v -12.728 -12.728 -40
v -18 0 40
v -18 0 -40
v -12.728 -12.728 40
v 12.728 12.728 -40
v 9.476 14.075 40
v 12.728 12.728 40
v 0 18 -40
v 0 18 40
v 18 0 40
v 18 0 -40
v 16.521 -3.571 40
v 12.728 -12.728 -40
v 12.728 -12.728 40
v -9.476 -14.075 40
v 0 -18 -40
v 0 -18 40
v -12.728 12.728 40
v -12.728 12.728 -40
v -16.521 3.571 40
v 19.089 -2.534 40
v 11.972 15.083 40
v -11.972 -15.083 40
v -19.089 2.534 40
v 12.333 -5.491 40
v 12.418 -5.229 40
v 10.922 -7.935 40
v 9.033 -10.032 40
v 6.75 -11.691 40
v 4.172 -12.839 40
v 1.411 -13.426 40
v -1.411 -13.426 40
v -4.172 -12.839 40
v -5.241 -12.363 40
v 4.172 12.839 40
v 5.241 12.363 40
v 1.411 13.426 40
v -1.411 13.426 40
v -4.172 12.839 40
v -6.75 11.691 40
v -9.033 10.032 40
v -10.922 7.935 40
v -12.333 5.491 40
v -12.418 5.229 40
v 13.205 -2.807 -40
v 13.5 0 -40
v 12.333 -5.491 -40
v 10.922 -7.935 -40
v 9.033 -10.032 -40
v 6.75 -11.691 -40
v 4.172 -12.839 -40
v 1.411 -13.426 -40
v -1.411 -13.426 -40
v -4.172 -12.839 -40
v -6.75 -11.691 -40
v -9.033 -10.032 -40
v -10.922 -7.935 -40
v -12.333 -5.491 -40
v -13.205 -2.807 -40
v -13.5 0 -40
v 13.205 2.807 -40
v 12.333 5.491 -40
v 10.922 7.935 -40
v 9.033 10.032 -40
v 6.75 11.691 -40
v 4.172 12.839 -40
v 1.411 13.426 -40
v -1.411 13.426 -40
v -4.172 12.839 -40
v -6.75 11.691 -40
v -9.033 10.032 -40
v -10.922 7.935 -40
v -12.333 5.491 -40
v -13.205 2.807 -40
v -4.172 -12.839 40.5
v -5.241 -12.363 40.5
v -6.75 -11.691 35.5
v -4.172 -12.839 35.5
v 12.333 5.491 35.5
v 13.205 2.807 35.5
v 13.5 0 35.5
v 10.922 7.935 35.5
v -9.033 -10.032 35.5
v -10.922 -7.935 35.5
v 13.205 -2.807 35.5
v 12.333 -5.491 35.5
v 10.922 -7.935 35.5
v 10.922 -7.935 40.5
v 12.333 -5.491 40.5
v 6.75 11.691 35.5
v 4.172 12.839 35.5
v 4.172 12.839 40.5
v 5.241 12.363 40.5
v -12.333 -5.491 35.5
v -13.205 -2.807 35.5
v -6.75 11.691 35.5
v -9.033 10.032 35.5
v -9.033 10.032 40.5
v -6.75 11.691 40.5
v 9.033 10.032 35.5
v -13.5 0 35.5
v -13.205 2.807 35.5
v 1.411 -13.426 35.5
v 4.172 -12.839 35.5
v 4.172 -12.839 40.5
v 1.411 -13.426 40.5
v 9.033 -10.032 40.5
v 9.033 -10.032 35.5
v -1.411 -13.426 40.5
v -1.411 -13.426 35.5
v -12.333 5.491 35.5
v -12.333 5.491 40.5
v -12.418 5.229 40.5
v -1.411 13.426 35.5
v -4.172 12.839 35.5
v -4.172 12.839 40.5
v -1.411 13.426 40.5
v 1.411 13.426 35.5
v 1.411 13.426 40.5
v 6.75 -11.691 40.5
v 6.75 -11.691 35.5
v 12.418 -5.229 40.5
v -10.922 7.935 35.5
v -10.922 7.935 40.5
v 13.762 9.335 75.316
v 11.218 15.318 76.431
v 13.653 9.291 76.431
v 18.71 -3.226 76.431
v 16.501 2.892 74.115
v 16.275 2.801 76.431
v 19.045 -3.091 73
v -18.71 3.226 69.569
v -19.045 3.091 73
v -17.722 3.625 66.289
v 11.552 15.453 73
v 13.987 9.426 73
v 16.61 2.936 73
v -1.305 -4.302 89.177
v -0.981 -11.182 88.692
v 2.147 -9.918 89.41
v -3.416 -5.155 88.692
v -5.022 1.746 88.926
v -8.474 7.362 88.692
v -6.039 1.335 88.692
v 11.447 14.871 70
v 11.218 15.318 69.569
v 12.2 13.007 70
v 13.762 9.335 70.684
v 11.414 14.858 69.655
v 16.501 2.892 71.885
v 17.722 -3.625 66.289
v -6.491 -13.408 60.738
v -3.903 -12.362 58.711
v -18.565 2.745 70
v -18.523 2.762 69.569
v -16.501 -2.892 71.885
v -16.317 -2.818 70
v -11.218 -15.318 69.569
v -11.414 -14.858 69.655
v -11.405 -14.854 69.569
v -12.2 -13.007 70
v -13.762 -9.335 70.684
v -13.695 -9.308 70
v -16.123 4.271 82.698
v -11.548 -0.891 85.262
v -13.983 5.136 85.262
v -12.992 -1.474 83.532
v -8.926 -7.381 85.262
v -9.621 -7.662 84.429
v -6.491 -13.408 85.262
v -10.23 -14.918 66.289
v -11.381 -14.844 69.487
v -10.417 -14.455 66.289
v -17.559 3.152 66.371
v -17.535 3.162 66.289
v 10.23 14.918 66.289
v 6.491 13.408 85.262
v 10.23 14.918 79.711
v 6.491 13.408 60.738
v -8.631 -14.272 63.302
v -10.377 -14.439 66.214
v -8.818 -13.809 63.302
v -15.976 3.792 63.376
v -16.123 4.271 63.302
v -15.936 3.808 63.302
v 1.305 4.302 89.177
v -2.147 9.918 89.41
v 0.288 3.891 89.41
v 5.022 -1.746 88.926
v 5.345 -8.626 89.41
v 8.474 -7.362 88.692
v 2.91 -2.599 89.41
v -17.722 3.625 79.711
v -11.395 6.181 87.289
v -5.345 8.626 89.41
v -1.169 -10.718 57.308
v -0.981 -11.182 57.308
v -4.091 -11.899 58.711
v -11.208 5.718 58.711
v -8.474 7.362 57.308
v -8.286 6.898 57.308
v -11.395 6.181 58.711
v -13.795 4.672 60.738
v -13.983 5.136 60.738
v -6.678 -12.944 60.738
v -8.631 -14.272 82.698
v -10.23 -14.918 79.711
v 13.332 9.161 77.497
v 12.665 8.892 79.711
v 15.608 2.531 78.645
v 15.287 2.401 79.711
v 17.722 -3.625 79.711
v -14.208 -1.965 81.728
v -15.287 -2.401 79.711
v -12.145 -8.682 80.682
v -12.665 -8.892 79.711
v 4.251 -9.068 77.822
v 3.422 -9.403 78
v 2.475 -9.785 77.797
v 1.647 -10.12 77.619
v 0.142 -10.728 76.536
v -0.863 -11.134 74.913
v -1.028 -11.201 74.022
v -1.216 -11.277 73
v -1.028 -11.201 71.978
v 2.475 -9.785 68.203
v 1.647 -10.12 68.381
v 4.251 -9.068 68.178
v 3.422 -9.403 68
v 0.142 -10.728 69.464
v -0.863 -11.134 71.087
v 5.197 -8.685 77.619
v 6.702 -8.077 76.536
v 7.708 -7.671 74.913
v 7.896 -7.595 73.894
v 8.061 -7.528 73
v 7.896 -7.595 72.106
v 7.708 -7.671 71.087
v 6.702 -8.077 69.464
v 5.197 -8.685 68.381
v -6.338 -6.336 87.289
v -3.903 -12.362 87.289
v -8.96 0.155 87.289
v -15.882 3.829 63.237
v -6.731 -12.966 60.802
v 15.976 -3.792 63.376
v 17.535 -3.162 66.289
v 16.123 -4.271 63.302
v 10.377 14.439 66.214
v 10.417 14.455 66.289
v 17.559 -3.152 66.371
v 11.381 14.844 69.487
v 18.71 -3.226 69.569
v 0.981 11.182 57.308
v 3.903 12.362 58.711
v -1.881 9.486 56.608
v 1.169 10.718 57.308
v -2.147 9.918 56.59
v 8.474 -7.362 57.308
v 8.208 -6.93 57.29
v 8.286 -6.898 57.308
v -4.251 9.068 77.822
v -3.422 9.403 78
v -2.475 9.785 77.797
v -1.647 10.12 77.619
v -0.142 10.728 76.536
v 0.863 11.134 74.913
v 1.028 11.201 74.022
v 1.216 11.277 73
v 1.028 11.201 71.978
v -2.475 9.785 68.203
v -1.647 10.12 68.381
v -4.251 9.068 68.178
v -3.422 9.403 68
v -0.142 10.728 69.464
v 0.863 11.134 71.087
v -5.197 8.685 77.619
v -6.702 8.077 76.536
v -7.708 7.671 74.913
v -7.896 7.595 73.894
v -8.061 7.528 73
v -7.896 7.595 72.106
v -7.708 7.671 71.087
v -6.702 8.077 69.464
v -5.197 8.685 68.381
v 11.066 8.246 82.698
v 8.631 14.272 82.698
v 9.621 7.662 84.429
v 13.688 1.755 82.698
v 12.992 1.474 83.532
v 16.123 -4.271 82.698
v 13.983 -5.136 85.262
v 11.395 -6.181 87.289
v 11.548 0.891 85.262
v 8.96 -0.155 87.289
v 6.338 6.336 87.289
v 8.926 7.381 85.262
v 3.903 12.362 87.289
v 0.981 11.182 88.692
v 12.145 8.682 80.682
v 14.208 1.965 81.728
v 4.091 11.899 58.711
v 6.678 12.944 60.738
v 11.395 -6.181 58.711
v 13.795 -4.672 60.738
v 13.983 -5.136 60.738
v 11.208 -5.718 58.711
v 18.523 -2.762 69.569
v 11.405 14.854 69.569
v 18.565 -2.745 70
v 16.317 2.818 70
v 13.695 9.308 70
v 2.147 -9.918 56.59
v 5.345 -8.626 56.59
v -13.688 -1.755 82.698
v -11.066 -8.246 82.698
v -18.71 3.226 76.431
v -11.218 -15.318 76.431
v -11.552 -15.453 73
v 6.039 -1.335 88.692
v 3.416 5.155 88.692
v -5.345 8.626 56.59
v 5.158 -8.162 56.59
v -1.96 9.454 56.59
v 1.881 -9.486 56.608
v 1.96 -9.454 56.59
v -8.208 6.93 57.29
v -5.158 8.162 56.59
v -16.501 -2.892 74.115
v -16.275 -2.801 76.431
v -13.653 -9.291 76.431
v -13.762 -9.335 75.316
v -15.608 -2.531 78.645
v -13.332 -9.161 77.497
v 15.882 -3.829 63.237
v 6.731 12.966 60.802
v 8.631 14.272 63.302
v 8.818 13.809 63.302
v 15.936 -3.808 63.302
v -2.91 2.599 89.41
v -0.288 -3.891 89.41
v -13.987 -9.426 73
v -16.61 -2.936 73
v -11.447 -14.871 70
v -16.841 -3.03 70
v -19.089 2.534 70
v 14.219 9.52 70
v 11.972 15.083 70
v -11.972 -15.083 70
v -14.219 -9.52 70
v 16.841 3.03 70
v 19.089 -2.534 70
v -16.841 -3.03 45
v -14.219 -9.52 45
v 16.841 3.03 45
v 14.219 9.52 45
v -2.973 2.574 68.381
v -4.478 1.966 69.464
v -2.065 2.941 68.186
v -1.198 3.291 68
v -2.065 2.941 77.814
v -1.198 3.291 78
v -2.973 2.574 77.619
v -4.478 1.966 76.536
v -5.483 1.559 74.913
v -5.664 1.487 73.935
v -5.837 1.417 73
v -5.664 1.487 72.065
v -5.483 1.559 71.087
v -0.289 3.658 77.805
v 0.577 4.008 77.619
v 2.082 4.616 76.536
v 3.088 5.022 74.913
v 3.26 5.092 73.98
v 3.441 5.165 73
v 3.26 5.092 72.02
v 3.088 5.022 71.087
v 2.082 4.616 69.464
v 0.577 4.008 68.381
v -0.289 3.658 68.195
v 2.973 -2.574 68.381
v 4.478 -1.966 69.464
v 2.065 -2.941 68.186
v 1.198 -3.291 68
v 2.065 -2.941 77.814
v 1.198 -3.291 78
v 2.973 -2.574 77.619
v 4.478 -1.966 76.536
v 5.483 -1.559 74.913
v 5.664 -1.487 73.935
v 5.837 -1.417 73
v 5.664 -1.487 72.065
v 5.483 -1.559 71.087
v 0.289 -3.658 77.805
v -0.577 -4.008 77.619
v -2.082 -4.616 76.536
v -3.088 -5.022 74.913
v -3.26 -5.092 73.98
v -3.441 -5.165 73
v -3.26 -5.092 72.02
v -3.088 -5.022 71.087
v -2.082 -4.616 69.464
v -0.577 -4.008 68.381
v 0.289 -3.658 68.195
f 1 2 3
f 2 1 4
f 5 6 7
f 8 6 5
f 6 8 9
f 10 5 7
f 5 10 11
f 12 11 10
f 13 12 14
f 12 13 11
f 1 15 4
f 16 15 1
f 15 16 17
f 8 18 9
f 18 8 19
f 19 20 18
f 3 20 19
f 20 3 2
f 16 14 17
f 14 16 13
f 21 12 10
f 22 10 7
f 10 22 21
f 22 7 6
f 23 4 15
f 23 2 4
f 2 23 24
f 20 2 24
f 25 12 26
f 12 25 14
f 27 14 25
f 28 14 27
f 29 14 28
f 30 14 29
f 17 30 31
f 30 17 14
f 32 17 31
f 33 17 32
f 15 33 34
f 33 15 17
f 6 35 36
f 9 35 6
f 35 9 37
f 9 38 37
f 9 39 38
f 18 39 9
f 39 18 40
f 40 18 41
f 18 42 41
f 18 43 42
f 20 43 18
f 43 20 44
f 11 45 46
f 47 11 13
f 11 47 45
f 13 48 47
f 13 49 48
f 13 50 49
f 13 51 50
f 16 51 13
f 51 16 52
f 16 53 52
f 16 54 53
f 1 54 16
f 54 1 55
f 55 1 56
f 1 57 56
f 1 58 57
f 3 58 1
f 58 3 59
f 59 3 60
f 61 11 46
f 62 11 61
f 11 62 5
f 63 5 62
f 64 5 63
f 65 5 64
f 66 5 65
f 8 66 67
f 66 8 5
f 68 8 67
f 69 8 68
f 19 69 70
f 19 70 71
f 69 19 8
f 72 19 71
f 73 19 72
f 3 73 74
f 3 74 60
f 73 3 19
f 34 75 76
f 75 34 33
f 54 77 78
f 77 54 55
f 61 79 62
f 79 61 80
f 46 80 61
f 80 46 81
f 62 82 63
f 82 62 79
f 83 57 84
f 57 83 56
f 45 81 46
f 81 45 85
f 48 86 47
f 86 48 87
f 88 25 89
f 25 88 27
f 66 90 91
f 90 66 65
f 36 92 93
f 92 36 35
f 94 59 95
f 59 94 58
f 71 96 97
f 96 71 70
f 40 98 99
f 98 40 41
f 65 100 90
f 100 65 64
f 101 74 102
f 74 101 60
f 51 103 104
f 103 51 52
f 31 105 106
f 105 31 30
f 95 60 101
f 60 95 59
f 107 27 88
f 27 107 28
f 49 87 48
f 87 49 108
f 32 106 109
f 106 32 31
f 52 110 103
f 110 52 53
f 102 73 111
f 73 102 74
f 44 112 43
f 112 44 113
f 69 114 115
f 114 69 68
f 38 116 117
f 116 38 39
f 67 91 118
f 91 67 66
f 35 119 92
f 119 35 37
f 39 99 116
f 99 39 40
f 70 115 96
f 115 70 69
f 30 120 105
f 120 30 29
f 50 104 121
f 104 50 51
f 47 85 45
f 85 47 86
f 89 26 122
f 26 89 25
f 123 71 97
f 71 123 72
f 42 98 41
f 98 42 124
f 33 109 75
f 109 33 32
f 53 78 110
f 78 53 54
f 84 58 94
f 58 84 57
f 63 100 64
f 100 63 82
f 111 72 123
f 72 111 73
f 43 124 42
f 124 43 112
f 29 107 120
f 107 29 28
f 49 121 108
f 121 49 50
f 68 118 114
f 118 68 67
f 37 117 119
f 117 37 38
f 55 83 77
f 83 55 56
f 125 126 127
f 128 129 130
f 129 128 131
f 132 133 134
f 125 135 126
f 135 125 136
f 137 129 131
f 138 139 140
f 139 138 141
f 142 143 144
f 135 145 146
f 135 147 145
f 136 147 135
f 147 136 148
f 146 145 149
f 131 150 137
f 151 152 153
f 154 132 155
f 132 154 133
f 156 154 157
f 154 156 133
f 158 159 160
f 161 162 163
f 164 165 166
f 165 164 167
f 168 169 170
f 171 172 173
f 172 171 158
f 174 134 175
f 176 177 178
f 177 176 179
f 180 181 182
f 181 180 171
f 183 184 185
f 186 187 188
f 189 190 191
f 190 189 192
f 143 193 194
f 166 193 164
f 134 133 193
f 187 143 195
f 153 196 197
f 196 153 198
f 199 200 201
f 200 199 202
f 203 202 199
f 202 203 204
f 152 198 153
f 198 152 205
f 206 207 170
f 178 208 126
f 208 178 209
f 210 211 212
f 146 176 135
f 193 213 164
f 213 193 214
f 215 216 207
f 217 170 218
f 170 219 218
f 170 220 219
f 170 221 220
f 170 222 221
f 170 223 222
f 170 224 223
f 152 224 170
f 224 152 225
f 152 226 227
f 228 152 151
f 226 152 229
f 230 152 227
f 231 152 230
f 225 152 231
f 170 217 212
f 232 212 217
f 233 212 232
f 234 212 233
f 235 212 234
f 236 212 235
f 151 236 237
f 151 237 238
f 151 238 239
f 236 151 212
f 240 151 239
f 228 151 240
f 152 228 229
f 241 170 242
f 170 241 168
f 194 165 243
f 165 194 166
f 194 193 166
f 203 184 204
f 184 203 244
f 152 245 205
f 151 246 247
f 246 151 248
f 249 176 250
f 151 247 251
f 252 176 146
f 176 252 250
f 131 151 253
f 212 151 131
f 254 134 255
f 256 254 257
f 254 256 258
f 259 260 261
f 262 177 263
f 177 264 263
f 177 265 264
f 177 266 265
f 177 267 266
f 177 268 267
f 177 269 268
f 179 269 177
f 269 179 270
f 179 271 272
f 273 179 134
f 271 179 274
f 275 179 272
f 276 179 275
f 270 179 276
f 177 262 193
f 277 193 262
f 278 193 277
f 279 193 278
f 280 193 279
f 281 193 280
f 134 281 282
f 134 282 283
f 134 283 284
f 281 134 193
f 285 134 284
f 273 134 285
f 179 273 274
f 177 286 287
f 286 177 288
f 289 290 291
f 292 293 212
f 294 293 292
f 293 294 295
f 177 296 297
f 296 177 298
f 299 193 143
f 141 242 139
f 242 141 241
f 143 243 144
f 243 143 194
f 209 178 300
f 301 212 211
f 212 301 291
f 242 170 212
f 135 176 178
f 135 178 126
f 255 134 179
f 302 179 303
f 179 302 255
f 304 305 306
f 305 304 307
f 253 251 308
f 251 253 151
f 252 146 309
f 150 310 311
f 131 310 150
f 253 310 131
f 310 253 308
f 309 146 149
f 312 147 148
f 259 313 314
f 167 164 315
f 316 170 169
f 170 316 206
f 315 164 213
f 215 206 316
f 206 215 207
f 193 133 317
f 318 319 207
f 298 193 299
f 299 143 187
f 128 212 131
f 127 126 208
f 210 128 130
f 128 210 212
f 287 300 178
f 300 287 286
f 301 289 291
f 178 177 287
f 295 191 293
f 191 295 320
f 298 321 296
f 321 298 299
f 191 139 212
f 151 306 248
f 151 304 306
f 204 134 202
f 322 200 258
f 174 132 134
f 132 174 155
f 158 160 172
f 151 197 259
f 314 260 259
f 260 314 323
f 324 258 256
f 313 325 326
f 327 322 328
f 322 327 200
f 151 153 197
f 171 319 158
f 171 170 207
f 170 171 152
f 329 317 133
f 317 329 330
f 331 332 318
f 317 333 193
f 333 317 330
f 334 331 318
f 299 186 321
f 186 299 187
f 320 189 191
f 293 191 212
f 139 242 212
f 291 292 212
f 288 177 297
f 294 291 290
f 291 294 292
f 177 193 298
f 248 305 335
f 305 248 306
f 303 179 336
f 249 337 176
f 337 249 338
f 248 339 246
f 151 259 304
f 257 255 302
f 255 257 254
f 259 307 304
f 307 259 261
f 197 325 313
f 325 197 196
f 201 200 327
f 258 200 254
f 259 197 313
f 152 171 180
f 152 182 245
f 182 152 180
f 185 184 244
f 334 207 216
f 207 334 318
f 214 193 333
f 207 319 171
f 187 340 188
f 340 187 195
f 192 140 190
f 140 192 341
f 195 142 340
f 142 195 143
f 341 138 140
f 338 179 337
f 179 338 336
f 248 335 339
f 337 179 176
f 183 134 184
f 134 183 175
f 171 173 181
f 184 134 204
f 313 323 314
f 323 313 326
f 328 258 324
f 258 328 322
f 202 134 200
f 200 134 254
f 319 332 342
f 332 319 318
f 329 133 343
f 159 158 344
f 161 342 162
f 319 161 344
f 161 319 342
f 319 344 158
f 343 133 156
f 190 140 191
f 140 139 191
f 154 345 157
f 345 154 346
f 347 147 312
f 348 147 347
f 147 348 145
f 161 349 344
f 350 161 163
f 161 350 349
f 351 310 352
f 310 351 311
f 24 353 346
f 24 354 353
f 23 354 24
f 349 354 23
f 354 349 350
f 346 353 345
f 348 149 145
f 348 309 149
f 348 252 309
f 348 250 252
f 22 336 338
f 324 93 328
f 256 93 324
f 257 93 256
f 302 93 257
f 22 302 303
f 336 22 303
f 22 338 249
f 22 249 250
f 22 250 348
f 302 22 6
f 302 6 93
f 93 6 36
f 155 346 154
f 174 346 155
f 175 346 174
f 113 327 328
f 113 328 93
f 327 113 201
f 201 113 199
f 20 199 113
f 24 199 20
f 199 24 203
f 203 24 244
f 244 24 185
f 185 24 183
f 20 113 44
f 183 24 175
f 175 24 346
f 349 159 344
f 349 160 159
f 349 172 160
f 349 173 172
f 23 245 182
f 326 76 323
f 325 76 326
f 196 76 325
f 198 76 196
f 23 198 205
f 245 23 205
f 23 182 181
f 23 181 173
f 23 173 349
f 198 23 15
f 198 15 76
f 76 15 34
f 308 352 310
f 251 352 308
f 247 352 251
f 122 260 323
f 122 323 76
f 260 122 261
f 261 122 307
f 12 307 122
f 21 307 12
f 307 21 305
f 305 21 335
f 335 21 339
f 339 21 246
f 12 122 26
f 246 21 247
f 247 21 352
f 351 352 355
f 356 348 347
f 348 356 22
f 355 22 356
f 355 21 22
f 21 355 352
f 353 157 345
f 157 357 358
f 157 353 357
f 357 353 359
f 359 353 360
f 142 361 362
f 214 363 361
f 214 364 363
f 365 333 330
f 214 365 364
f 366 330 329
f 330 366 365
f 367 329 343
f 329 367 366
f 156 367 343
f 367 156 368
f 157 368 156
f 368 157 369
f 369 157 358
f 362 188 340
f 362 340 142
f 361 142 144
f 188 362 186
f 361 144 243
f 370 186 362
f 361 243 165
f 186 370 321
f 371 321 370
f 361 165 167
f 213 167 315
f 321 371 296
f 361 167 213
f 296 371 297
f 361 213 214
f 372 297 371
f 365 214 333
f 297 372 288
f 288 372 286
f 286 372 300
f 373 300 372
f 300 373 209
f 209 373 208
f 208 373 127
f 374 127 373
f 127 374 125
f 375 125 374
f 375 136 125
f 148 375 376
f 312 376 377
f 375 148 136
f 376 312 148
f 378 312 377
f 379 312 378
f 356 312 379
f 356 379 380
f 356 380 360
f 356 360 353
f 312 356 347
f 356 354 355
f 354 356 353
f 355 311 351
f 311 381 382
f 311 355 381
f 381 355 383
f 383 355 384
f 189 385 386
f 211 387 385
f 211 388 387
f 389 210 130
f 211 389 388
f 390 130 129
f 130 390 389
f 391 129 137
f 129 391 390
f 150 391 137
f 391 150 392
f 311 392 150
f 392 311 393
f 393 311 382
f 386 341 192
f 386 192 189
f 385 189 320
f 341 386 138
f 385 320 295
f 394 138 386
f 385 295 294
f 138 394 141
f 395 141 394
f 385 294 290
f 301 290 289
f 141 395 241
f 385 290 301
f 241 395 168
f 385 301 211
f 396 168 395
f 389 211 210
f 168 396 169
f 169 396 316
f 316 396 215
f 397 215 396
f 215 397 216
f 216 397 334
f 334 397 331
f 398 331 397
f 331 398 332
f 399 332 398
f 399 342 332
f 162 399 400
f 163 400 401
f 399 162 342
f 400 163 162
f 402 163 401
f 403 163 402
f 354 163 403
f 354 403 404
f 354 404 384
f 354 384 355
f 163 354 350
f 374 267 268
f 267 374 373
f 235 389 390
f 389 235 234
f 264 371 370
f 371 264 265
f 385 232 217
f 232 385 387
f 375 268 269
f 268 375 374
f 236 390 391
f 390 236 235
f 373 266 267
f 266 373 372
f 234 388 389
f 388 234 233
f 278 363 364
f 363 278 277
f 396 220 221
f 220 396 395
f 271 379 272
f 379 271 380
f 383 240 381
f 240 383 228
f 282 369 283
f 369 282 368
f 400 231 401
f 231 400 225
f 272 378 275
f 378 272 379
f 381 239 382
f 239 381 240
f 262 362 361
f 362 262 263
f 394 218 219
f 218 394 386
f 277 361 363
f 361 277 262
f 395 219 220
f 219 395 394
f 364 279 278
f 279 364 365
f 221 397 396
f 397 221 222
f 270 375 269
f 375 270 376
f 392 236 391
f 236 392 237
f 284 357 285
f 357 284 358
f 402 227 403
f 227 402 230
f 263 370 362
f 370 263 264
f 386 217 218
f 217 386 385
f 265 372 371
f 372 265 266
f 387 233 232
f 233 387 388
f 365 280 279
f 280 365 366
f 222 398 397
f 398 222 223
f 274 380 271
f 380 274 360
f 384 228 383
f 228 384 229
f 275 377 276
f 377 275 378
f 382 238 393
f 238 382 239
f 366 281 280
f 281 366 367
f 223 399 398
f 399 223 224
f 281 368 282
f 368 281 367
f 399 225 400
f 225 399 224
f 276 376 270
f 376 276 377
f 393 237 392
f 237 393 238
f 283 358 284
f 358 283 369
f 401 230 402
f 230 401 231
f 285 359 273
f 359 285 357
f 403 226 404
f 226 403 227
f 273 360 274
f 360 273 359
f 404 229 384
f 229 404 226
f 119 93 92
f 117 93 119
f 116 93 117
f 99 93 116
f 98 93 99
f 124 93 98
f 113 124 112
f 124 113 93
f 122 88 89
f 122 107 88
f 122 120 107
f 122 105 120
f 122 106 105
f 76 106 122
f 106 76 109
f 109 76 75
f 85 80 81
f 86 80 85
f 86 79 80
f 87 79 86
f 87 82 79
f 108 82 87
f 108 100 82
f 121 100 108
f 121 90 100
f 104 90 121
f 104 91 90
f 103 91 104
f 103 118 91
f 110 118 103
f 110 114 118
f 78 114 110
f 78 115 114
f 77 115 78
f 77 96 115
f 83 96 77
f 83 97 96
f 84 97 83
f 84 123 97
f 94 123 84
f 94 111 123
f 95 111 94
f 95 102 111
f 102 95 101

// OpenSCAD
union(){
// pricteni pro zesileni podku
difference(){
 

difference(){
// odecteni stredu pro zasazeni
union (){
//pricteni pulvalce

union(){
// pricteni pulvalce

difference() {
//odecet vnitrku 6 uhelniku


union() {
// union pro zakladni 6 uhelnik pro nasazeni na tyc

translate([0,0,-40]) rotate([0,0,0]) cylinder(h=80,r=18,$fn=8);

}

cylinder(h = 80, r = 13.5, center = true);
//odecet vnitrku 6 uhelniku
}
//#translate([0,0,0])  rotate([90,0,0]) cylinder(h = 400, r = 20, center = false);

}
//////////////////
//union(){

#translate([0,0,73]) rotate ([90,0,22])cylinder(h = 20, r=16.5, center = true);
// kruh pro osazeni do civky

//translate([0,0,0]) rotate ([0,0,0]) cube(size = [70,70,70], center = true);




#translate([0,0,55]) rotate ([0,0,22]) cube(size = [33.5,19,30], center = true);
}
// pricteni krychle pro vysunuti pulkruhu
translate([0,0,90]) rotate ([0,0,22]) cube(size = [90,7,90], center = true);
// 7 je sirka mezery pro stlaceni
}

#translate([0,0,73]) rotate ([90,0,20])cylinder(h =300 , r=5, center = true);
}
#translate([0,0,38]) rotate ([0,0,0])cylinder(h = 5, r = 13.5, center = true);
// pricteni pro zesileni podku


}
// #
